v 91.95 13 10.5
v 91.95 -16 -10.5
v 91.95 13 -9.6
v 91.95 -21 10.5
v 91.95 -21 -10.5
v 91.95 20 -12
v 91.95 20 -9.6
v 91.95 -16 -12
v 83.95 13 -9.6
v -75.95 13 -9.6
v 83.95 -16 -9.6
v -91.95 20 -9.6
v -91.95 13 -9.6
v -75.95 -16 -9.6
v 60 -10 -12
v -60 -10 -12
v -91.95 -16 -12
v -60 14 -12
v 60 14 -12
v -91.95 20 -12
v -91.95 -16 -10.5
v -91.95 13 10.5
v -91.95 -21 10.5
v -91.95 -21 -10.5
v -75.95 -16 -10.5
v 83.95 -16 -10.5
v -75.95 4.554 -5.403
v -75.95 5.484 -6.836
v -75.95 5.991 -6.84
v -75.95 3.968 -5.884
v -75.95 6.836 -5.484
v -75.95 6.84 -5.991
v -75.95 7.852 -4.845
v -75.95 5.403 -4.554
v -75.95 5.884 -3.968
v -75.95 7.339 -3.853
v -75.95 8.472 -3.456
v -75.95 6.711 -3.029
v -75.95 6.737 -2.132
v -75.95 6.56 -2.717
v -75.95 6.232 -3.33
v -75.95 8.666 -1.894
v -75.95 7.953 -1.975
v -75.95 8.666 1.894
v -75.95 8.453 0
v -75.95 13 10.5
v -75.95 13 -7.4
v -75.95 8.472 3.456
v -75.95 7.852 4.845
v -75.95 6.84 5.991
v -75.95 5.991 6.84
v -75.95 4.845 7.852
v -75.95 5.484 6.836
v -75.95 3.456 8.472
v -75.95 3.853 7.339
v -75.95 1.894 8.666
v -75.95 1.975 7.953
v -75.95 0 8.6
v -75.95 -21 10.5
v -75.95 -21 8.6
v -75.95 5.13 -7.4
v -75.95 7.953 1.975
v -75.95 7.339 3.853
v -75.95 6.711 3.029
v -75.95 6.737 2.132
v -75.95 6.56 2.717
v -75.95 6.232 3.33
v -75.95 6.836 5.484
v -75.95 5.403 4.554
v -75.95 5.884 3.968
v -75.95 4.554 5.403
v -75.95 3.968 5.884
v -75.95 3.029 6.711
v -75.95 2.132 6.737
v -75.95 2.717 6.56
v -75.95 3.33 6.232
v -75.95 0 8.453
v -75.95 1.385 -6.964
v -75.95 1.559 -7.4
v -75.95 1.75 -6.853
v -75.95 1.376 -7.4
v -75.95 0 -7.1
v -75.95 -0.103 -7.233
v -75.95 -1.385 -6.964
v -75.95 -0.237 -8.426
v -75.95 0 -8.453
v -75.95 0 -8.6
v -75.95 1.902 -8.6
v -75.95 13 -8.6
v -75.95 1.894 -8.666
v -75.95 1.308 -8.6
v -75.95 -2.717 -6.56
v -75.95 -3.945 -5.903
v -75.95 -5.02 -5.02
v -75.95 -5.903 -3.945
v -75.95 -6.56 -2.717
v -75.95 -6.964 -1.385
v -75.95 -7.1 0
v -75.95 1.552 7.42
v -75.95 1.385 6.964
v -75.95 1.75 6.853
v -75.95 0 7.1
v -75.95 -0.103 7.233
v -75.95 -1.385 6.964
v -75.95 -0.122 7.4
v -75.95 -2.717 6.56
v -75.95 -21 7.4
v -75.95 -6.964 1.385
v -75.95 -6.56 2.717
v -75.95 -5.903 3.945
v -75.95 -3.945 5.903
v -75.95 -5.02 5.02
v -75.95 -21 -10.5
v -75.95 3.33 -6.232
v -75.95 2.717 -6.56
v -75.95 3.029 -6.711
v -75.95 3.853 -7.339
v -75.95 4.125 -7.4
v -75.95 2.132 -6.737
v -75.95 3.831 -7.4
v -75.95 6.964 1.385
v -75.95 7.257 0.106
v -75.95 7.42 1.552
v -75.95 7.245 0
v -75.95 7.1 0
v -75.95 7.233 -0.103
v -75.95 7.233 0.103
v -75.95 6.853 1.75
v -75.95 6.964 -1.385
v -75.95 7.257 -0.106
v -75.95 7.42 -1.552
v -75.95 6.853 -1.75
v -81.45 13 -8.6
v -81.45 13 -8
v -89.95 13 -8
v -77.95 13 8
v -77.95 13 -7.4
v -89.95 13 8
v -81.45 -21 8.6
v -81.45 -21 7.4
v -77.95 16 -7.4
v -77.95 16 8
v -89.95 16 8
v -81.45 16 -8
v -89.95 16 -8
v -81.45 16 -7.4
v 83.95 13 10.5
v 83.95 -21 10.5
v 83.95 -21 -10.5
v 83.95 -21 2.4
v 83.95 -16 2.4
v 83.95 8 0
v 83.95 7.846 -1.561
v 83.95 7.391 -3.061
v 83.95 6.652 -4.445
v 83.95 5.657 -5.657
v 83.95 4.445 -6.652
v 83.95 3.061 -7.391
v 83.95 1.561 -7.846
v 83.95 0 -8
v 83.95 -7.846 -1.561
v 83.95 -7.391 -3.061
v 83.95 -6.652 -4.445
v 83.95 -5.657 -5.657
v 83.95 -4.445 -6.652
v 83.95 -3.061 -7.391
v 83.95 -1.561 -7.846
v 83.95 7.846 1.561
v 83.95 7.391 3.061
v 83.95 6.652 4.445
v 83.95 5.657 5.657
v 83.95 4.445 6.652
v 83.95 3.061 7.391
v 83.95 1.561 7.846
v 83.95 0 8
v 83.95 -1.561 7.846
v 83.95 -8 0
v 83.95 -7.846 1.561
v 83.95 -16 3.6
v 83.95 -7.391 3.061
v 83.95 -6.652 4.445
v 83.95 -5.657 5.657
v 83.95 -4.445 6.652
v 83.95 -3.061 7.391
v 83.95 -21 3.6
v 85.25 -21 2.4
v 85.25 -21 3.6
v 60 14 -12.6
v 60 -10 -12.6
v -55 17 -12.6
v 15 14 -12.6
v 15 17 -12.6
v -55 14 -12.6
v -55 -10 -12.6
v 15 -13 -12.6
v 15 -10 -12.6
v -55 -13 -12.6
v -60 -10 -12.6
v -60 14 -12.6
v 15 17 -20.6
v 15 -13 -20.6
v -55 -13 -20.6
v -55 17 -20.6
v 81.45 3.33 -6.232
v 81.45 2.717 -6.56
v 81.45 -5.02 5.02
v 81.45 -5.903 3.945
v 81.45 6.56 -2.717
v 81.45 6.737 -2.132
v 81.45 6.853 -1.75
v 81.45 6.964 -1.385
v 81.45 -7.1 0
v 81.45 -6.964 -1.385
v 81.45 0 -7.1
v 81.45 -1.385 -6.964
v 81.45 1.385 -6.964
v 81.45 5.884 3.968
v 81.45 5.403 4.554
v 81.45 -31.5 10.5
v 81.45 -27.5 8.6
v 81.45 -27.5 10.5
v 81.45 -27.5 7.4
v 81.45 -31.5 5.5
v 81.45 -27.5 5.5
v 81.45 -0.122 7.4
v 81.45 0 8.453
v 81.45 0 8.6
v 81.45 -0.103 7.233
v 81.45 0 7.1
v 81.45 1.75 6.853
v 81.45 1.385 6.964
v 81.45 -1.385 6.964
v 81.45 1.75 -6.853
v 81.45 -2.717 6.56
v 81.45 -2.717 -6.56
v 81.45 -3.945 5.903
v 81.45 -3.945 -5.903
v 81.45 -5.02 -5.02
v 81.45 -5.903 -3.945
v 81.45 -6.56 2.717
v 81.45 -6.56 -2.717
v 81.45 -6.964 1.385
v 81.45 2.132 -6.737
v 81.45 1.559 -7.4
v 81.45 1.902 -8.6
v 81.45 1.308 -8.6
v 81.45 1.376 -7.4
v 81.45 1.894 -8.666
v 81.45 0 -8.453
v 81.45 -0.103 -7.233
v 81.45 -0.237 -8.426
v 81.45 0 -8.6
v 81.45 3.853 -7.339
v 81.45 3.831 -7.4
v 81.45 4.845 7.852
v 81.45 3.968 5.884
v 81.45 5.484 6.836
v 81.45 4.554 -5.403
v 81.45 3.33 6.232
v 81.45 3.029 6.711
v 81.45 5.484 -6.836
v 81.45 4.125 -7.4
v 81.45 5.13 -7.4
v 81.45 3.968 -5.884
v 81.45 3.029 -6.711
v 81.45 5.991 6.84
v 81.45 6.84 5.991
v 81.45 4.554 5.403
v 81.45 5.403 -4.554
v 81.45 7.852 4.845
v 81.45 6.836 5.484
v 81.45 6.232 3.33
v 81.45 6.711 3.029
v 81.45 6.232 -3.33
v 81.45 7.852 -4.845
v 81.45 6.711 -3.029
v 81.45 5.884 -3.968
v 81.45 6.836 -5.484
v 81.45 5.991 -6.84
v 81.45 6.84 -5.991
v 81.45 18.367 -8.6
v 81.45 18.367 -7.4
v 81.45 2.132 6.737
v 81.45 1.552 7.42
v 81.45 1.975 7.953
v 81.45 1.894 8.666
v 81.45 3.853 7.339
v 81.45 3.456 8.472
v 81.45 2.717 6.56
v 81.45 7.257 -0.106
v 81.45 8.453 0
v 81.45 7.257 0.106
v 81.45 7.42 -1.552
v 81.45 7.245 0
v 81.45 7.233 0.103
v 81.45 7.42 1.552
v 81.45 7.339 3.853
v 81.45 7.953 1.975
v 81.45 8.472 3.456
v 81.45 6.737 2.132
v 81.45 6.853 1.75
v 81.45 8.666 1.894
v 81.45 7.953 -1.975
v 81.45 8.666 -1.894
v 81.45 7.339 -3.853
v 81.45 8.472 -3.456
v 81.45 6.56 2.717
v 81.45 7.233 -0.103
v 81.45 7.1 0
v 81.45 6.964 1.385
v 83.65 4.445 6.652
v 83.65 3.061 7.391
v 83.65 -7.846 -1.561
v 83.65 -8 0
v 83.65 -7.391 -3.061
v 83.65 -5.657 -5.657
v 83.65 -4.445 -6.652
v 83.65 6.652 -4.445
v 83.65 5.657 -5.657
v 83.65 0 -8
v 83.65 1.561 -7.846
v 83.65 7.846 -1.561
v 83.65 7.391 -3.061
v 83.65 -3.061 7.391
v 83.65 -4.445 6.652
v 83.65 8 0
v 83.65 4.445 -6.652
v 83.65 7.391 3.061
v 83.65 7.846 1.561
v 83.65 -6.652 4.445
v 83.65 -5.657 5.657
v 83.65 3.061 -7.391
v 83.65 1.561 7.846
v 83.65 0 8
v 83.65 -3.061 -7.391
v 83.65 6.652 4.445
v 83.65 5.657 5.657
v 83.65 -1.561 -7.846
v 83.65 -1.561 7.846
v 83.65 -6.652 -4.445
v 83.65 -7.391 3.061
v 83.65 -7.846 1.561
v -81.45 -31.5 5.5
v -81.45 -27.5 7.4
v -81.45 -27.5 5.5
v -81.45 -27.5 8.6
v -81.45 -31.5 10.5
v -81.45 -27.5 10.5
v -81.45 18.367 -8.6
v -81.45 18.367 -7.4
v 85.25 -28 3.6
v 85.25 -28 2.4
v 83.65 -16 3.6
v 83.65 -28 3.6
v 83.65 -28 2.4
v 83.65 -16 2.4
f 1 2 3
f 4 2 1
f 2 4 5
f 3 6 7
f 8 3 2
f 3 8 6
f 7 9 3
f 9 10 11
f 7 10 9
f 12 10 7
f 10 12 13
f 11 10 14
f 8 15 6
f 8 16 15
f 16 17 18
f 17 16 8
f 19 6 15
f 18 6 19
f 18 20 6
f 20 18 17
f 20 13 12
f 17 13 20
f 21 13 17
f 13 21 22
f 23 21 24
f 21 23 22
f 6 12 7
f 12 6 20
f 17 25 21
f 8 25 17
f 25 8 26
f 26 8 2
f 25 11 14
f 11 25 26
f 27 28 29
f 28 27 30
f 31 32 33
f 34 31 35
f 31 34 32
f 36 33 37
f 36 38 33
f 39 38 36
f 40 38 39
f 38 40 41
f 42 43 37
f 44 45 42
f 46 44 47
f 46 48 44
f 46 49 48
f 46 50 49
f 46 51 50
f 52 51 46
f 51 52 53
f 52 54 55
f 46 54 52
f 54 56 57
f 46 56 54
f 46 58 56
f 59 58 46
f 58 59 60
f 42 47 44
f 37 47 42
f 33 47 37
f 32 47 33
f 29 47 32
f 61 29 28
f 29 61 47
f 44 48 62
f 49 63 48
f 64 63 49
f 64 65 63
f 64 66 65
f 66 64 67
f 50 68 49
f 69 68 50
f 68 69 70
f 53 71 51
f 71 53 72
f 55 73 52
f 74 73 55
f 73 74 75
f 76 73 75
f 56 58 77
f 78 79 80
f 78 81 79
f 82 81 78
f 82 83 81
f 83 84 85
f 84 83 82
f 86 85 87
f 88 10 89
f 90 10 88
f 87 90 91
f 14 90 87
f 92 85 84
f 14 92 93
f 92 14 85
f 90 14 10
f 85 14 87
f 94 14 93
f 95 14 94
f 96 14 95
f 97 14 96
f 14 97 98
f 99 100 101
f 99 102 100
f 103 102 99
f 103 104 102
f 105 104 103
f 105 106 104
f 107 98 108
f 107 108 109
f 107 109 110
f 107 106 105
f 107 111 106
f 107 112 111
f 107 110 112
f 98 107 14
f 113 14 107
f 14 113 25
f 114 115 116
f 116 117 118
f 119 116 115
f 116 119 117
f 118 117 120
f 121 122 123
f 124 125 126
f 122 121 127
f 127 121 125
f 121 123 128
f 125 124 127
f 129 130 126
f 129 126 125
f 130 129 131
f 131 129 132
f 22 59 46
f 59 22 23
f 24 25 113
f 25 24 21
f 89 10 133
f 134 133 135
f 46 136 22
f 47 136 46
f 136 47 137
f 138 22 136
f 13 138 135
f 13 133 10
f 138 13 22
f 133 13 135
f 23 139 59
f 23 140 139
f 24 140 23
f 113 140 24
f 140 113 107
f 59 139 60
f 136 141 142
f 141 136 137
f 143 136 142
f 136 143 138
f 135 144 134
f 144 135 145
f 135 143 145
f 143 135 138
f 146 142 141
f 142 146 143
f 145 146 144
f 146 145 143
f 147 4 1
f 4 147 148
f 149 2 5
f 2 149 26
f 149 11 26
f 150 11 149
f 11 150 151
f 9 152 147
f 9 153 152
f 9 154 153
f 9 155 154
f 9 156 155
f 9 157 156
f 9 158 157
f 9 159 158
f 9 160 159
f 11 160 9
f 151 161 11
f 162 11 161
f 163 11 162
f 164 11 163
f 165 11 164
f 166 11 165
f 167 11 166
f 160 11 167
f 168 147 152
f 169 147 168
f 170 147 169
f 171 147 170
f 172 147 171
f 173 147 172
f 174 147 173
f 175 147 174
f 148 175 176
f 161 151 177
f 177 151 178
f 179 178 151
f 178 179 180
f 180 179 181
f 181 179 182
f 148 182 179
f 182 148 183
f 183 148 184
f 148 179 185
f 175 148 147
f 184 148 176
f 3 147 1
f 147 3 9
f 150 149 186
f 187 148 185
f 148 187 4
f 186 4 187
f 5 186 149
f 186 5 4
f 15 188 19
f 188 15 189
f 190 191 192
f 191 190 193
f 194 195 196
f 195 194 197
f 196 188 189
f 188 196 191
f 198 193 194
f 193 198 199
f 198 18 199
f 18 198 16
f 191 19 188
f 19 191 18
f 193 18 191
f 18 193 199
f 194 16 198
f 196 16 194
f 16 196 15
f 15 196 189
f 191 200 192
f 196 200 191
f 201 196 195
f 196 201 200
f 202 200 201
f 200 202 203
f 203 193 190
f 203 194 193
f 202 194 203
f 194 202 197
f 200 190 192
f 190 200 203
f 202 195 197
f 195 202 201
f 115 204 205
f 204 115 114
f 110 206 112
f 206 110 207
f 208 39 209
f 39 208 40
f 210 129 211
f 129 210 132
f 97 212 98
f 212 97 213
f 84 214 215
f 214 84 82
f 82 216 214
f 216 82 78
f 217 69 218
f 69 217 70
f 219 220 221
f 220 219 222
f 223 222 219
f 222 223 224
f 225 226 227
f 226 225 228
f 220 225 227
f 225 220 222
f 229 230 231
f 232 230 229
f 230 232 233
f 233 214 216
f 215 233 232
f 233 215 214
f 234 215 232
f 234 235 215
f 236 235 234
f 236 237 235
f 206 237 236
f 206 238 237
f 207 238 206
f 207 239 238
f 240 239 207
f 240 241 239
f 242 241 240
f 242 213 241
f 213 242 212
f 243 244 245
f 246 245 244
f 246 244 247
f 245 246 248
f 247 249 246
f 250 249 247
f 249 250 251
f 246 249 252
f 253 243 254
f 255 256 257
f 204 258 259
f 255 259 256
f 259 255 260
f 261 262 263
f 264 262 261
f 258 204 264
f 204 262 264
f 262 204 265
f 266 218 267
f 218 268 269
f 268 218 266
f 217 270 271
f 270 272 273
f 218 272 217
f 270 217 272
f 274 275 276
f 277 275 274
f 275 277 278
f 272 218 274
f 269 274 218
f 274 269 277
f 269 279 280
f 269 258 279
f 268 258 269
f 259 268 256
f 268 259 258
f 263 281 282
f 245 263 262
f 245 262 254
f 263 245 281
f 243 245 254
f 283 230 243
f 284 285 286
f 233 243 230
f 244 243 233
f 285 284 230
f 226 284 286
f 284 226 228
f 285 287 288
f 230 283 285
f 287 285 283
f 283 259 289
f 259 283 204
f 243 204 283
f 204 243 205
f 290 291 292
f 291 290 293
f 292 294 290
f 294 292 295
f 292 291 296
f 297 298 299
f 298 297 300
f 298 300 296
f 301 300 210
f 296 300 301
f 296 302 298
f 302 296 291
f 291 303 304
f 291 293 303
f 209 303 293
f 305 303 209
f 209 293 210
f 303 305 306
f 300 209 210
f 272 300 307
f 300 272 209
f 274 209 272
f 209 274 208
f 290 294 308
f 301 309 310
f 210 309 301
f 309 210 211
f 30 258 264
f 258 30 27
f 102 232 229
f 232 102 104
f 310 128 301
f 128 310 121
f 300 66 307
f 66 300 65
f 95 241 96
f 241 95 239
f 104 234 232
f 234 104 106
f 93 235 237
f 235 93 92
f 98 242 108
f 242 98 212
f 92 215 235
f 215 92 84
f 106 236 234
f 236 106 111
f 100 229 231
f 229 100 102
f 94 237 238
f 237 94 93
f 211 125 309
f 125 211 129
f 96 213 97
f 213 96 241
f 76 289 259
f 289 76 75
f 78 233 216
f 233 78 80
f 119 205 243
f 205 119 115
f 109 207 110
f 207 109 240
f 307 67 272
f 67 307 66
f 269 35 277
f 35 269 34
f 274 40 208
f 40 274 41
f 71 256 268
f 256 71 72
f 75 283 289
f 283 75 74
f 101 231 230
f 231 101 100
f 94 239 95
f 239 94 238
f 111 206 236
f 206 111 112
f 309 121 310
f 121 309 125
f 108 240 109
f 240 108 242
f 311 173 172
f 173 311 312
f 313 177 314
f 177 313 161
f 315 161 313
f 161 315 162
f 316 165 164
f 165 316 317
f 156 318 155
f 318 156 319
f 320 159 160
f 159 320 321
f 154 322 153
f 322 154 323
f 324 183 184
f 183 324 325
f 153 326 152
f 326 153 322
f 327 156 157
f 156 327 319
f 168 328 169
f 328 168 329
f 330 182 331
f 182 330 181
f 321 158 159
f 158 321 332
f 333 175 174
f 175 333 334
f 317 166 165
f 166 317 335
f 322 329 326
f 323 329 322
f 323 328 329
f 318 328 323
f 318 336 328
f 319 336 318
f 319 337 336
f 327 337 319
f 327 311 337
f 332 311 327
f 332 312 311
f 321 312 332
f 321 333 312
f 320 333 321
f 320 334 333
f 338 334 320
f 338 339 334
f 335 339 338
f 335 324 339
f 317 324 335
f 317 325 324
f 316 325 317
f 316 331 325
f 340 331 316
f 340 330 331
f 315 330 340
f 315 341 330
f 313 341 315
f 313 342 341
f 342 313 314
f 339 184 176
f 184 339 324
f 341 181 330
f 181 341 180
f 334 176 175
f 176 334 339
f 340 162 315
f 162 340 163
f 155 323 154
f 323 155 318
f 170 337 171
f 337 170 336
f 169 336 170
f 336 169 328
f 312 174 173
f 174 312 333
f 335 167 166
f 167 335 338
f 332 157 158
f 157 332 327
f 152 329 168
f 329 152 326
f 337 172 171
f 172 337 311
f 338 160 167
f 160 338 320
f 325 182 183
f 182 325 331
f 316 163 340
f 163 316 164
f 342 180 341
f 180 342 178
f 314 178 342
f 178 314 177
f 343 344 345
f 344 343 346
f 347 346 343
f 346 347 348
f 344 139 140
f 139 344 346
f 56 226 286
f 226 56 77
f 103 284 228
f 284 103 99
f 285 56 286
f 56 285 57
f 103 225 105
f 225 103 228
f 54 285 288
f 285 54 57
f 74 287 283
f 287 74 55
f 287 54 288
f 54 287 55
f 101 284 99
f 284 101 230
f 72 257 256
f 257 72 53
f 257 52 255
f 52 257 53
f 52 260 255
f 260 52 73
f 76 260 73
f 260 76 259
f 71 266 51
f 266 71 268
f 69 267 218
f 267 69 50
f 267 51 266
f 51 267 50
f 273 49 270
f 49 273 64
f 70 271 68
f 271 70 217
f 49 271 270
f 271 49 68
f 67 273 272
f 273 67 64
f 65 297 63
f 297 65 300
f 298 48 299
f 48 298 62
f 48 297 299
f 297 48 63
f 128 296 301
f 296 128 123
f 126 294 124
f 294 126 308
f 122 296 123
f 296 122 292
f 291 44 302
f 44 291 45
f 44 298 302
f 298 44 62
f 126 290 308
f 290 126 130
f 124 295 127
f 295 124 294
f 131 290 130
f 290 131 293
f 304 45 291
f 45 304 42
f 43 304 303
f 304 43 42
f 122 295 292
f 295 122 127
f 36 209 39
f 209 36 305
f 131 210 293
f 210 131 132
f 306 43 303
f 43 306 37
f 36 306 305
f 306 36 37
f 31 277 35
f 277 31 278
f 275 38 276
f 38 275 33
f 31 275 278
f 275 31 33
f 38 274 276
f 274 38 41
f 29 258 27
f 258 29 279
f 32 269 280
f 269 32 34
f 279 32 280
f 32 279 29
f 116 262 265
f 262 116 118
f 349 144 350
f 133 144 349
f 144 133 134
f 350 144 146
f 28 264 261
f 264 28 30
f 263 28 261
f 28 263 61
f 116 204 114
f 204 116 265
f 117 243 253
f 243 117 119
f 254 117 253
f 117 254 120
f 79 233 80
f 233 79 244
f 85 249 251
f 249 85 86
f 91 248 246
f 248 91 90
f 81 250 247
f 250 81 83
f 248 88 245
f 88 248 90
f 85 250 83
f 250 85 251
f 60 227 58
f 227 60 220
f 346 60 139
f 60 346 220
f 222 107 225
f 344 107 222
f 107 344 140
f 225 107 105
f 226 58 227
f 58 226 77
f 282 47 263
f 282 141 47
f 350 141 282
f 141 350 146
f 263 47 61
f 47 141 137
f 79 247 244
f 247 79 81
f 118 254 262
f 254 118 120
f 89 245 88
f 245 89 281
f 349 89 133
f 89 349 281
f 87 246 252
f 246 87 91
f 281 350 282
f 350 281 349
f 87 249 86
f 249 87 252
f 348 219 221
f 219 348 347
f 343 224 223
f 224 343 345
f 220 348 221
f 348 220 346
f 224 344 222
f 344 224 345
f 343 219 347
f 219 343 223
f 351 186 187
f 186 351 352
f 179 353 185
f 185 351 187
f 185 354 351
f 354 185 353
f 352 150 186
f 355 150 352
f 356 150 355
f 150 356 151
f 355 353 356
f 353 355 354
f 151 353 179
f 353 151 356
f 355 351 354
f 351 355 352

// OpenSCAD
// NEXUS ONE - ROLL architecture v0.7
// v0.7 adds the four systems v0.6 left open (see reports/REPORT_v0_7.md):
//  FPC rolling U-loop (R6) + driver board inside a longer TAIL cap
//  (device length 171.9 -> 183.9), constant-force drum spring (12 N*mm),
//  PC/ABS end caps as antenna windows, and the back module bay
//  (120x24 rail, 8 pogo pins, magnets) with a battery module shown.
// One REAL flexible AMOLED (162.9 x 74.5 x 1.2 mm module class, 2400x1080)
// wraps an R8 drum inside the spine; a sliding leading bar unrolls it.
// Replaces MECH-B's 3 stacked display frames: a continuous panel cannot fold
// at MECH-B's 3.4 mm layer pitch (bend radius would be ~1.7 mm; AMOLED needs
// >= ~5 mm). Wrap radius here is 8 mm at EVERY pose (checker-verified:
// panel length conserved exactly, 1,001 poses).
// Interlocks designed in:
//  1. Rack on the leading bar drives the drum pinion (module 0.5, 32 teeth,
//     pitch radius = drum radius 8) - panel feed rate == bar speed, the panel
//     can never be yanked faster than the drum feeds it.
//  2. Light-field lenticular cover rail-mounts only at full deployment; while
//     mounted its rails block retraction (film can never be crushed by closing).
//  3. Spring-ball detents + 2 pairs N52 5x2 magnets hold both end positions
//     (retention spec >= 3 N, from the v0.4 jolt analysis).
// OpenSCAD: View > Animate, Steps=201, FPS=20. $t = deployment 0..1.
// NOT compiled - OpenSCAD unavailable in the build environment (balance-checked).
// X = device length (panel length); Y = deployment; Z = panel normal.

$fn = 32;
panel_l = 162.9;
panel_t = 1.2;
L_use = 71.5;            // usable panel width (74.5 - 2x1.5 sealed edges)
R = 8;                   // drum radius to panel centreline
F0 = 28;                 // front flat, stick mode (visible strip)
F1 = 58.9;               // front flat, fully open
dev_l = 183.9;           // v0.7: longer tail cap (driver board + FPC loop)
show_cover = false;      // light-field cover (stored in carry-case sleeve)
show_module = true;      // battery module on the back bay

function front(u) = F0 + (F1 - F0) * u;
function back_flat(u) =
    let (b0 = L_use - F0 - PI * R)
    u < 0.85 ? max(0, b0 * (1 - u / 0.85)) : 0;
function theta(u) = (L_use - front(u) - back_flat(u)) / R;   // radians, pi..pi/2

module panel_ribbon(u) {
    F = front(u); B = back_flat(u); th = theta(u);
    color([0.15, 0.45, 0.95, 0.95]) {
        // front flat
        translate([0, -F / 2, R]) cube([panel_l, F, panel_t], center = true);
        // back flat
        if (B > 0.3)
            translate([0, B / 2, -R]) cube([panel_l, B, panel_t], center = true);
        // wrap arc as chord segments
        K = 14;
        for (i = [0 : K - 1]) {
            a_deg = 90 - (i + 0.5) * th * 180 / PI / K;
            seg = R * th / K + 0.35;
            translate([0, R * cos(a_deg), R * sin(a_deg)])
                rotate([90 - a_deg, 0, 0])
                    cube([panel_l, seg, panel_t], center = true);
        }
    }
}

module drum() {
    color([0.55, 0.58, 0.63, 1])
    rotate([0, 90, 0]) cylinder(h = panel_l, r = R - panel_t / 2 - 0.3, center = true);
    // pinion gear (sync interlock) - schematic: cylinder + teeth blocks
    color([0.85, 0.65, 0.2, 1])
    translate([panel_l / 2 + 3, 0, 0]) rotate([0, 90, 0])
        cylinder(h = 1.6, r = R, center = true);
}

module leading_bar(u) {
    F = front(u);
    color([0.2, 0.22, 0.27, 1])
    translate([0, -F - 1.5, R]) cube([panel_l, 4, 5], center = true);
    // rack (schematic teeth) on the bar underside, meshes the drum pinion path
    color([0.85, 0.65, 0.2, 1])
    translate([panel_l / 2 + 3, -F + 6, R - 5]) cube([1.6, 12, 1.2], center = true);
}

module housing(u) {
    // back shell + two end caps; front stays open (the panel IS the front)
    color([0.13, 0.15, 0.19, 0.9])
    translate([0, 2, -R - panel_t - 1.6]) cube([dev_l, 36, 2.4], center = true);
    // TAIL cap (x-): 16 wide - driver board + FPC loop pocket. PC/ABS = antenna window.
    color([0.35, 0.38, 0.44, 1])
    translate([-(dev_l / 2 - 8), -4, 0]) cube([16, 34, 21], center = true);
    // FPC loop pocket inside tail cap (translucent marker)
    color([0.95, 0.6, 0.15, 0.45])
    translate([-(dev_l / 2 - 8), 3, 0]) cube([12, 26, 16], center = true);
    // HEAD cap (x+): 8 wide, also PC/ABS antenna window
    color([0.35, 0.38, 0.44, 1])
    translate([dev_l / 2 - 4, -4, 0]) cube([8, 34, 21], center = true);
}

module module_bay() {
    // dovetail rail recess on the back shell + pogo field (schematic)
    color([0.05, 0.05, 0.07, 1])
    translate([0, 2, -R - panel_t - 3.0]) cube([120, 24, 0.8], center = true);
    color([0.85, 0.65, 0.2, 1])
    translate([0, 2, -R - panel_t - 3.2]) cube([16, 10, 0.6], center = true);
    if (show_module)
        // battery module +10 Wh (70x30x8) magnet-latched on the rail
        color([0.22, 0.25, 0.31, 1])
        translate([-20, 2, -R - panel_t - 7.4]) cube([70, 30, 8], center = true);
}

module light_field_cover() {
    // mounts only at full open; shown hovering at its mounted plane
    cover_y = -F1 + (F1 + R * PI / 2) / 2;
    color([0.6, 0.85, 1.0, 0.35])
    translate([0, cover_y, R + panel_t + 1.5])
        cube([panel_l, F1 + R * PI / 2, 0.5], center = true);
}

u = min(1, max(0, $t));
housing(u);
module_bay();
drum();
panel_ribbon(u);
leading_bar(u);
if (show_cover) light_field_cover();

// Open items: dynamic rolling cycle rating of the maker panel (unverified),
// panel driver-board integration test, spring fatigue data, RF testing of the
// cap windows, module electronics (battery/camera/storage module internals).
